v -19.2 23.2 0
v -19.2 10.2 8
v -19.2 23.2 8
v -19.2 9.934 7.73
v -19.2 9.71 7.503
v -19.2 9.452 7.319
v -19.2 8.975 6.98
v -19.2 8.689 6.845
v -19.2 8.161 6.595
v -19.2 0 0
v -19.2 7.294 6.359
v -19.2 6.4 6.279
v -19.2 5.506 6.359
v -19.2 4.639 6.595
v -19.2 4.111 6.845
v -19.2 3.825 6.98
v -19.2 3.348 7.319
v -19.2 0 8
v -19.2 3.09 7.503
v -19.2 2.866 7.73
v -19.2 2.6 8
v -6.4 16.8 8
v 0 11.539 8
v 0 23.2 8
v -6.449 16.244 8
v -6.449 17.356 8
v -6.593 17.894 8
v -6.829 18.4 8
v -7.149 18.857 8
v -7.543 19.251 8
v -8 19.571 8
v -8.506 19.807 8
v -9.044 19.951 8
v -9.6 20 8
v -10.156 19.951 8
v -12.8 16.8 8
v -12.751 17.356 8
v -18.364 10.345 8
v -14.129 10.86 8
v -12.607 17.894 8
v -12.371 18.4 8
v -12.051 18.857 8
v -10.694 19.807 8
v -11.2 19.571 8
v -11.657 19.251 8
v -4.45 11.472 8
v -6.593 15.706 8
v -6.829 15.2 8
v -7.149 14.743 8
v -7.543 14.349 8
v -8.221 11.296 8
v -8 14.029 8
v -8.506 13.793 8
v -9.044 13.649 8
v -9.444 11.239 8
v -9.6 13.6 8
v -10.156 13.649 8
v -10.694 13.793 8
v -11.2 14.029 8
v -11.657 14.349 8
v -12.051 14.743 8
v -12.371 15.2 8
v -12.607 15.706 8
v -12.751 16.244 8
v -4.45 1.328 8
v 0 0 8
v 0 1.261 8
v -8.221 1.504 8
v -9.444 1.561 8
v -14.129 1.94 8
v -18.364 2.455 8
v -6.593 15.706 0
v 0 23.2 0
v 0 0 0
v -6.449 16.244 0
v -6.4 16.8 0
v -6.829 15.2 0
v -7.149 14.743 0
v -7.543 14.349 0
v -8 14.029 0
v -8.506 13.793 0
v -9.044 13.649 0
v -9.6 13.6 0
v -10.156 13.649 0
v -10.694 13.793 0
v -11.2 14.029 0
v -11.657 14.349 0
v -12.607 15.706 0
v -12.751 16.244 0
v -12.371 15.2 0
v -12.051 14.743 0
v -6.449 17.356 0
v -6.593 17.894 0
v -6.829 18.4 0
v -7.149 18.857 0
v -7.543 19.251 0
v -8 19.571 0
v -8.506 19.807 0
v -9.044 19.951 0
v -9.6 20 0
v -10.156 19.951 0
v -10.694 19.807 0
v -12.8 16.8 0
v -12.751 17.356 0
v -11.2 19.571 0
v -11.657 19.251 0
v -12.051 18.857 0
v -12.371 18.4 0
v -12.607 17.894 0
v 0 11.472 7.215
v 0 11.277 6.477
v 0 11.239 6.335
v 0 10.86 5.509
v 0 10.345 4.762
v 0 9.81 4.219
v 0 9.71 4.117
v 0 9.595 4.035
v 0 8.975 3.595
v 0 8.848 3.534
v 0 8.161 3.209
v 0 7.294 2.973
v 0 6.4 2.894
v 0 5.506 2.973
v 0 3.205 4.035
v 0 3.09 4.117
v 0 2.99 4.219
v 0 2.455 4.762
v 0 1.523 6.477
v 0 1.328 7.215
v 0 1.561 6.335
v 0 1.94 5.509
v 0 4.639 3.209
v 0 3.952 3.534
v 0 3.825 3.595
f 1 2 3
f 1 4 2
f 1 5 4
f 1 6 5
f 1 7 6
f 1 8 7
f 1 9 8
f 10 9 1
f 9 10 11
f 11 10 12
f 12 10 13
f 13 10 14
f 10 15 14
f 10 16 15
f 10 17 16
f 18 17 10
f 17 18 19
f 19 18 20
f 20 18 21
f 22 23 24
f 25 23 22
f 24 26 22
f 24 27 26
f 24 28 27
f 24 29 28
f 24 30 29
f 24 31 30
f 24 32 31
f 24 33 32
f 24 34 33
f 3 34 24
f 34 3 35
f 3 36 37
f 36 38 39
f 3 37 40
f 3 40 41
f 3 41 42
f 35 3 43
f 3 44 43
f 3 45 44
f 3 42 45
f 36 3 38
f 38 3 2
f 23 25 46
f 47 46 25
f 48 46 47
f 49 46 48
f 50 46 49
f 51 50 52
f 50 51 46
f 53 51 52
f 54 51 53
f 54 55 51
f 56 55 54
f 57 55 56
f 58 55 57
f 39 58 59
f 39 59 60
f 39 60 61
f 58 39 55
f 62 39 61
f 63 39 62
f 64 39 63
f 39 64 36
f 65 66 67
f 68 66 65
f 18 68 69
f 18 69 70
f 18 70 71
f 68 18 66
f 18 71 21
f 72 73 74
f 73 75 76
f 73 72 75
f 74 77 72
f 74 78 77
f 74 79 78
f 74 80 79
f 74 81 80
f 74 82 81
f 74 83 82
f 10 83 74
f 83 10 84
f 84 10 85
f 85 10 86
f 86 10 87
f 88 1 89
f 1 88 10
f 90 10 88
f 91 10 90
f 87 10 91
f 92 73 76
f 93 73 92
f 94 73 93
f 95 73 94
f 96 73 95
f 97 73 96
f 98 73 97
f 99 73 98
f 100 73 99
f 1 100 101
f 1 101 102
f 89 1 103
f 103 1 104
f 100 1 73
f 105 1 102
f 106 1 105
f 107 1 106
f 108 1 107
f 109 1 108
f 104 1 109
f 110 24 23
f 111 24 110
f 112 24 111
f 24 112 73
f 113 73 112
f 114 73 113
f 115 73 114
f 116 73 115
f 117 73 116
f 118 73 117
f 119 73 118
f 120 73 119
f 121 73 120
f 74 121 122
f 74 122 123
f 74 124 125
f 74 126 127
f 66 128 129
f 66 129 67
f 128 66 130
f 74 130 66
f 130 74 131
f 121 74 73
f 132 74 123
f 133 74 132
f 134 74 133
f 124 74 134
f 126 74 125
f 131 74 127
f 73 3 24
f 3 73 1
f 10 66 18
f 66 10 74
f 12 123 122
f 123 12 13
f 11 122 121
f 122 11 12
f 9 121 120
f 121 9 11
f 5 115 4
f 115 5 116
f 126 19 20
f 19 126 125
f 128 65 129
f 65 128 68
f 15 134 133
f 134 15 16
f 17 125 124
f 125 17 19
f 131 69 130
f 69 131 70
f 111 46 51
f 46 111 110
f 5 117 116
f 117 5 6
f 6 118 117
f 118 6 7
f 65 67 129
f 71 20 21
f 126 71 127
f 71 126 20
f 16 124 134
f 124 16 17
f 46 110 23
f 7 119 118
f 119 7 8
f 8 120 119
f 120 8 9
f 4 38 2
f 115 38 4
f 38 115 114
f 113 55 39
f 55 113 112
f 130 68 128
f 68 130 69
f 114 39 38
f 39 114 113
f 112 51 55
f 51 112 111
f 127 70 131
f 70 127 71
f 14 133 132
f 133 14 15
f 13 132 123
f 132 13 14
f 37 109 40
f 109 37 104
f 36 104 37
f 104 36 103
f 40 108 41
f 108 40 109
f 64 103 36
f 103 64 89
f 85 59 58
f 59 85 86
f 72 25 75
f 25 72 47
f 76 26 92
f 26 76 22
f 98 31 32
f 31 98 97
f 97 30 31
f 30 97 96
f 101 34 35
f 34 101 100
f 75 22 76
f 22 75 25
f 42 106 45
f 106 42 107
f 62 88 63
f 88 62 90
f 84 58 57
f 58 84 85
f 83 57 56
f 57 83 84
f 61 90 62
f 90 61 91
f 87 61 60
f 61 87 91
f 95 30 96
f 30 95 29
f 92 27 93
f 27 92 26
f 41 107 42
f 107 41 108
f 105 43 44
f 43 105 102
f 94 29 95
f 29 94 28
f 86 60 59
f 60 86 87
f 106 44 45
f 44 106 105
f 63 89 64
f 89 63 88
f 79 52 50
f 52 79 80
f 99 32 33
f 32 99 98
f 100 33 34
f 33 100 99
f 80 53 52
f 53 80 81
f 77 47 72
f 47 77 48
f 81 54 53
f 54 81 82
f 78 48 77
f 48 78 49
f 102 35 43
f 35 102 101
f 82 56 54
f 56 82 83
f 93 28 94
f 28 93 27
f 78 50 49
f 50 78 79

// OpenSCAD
$fn=36;

a=10.3;

b=9.2;
c=10.2;

ds=6.4;

d=20;

module holm()
{
rotate([0,-10,0])
translate([-15,0,hk])
rotate([0,90,0])
cylinder(h=100, d=a);
}

//abstandhalte für holm winkel einstellung
//cube([1,1,b]);
//translate([ds,0,0])
//cube([1,1,c]);

hk=8;
bk=ds*3;
//dk=d+a+ds*2;
dk=20+ds/2;

mirror([1,0,0])
difference()
{
cube([bk,dk,hk]);
    
translate([0,ds,0])
holm();
    
    schraube();
}

module schraube()
{
translate([bk/2,(-ds/2)+20,0])
color("red")
cylinder(h=hk, d=ds);
}
